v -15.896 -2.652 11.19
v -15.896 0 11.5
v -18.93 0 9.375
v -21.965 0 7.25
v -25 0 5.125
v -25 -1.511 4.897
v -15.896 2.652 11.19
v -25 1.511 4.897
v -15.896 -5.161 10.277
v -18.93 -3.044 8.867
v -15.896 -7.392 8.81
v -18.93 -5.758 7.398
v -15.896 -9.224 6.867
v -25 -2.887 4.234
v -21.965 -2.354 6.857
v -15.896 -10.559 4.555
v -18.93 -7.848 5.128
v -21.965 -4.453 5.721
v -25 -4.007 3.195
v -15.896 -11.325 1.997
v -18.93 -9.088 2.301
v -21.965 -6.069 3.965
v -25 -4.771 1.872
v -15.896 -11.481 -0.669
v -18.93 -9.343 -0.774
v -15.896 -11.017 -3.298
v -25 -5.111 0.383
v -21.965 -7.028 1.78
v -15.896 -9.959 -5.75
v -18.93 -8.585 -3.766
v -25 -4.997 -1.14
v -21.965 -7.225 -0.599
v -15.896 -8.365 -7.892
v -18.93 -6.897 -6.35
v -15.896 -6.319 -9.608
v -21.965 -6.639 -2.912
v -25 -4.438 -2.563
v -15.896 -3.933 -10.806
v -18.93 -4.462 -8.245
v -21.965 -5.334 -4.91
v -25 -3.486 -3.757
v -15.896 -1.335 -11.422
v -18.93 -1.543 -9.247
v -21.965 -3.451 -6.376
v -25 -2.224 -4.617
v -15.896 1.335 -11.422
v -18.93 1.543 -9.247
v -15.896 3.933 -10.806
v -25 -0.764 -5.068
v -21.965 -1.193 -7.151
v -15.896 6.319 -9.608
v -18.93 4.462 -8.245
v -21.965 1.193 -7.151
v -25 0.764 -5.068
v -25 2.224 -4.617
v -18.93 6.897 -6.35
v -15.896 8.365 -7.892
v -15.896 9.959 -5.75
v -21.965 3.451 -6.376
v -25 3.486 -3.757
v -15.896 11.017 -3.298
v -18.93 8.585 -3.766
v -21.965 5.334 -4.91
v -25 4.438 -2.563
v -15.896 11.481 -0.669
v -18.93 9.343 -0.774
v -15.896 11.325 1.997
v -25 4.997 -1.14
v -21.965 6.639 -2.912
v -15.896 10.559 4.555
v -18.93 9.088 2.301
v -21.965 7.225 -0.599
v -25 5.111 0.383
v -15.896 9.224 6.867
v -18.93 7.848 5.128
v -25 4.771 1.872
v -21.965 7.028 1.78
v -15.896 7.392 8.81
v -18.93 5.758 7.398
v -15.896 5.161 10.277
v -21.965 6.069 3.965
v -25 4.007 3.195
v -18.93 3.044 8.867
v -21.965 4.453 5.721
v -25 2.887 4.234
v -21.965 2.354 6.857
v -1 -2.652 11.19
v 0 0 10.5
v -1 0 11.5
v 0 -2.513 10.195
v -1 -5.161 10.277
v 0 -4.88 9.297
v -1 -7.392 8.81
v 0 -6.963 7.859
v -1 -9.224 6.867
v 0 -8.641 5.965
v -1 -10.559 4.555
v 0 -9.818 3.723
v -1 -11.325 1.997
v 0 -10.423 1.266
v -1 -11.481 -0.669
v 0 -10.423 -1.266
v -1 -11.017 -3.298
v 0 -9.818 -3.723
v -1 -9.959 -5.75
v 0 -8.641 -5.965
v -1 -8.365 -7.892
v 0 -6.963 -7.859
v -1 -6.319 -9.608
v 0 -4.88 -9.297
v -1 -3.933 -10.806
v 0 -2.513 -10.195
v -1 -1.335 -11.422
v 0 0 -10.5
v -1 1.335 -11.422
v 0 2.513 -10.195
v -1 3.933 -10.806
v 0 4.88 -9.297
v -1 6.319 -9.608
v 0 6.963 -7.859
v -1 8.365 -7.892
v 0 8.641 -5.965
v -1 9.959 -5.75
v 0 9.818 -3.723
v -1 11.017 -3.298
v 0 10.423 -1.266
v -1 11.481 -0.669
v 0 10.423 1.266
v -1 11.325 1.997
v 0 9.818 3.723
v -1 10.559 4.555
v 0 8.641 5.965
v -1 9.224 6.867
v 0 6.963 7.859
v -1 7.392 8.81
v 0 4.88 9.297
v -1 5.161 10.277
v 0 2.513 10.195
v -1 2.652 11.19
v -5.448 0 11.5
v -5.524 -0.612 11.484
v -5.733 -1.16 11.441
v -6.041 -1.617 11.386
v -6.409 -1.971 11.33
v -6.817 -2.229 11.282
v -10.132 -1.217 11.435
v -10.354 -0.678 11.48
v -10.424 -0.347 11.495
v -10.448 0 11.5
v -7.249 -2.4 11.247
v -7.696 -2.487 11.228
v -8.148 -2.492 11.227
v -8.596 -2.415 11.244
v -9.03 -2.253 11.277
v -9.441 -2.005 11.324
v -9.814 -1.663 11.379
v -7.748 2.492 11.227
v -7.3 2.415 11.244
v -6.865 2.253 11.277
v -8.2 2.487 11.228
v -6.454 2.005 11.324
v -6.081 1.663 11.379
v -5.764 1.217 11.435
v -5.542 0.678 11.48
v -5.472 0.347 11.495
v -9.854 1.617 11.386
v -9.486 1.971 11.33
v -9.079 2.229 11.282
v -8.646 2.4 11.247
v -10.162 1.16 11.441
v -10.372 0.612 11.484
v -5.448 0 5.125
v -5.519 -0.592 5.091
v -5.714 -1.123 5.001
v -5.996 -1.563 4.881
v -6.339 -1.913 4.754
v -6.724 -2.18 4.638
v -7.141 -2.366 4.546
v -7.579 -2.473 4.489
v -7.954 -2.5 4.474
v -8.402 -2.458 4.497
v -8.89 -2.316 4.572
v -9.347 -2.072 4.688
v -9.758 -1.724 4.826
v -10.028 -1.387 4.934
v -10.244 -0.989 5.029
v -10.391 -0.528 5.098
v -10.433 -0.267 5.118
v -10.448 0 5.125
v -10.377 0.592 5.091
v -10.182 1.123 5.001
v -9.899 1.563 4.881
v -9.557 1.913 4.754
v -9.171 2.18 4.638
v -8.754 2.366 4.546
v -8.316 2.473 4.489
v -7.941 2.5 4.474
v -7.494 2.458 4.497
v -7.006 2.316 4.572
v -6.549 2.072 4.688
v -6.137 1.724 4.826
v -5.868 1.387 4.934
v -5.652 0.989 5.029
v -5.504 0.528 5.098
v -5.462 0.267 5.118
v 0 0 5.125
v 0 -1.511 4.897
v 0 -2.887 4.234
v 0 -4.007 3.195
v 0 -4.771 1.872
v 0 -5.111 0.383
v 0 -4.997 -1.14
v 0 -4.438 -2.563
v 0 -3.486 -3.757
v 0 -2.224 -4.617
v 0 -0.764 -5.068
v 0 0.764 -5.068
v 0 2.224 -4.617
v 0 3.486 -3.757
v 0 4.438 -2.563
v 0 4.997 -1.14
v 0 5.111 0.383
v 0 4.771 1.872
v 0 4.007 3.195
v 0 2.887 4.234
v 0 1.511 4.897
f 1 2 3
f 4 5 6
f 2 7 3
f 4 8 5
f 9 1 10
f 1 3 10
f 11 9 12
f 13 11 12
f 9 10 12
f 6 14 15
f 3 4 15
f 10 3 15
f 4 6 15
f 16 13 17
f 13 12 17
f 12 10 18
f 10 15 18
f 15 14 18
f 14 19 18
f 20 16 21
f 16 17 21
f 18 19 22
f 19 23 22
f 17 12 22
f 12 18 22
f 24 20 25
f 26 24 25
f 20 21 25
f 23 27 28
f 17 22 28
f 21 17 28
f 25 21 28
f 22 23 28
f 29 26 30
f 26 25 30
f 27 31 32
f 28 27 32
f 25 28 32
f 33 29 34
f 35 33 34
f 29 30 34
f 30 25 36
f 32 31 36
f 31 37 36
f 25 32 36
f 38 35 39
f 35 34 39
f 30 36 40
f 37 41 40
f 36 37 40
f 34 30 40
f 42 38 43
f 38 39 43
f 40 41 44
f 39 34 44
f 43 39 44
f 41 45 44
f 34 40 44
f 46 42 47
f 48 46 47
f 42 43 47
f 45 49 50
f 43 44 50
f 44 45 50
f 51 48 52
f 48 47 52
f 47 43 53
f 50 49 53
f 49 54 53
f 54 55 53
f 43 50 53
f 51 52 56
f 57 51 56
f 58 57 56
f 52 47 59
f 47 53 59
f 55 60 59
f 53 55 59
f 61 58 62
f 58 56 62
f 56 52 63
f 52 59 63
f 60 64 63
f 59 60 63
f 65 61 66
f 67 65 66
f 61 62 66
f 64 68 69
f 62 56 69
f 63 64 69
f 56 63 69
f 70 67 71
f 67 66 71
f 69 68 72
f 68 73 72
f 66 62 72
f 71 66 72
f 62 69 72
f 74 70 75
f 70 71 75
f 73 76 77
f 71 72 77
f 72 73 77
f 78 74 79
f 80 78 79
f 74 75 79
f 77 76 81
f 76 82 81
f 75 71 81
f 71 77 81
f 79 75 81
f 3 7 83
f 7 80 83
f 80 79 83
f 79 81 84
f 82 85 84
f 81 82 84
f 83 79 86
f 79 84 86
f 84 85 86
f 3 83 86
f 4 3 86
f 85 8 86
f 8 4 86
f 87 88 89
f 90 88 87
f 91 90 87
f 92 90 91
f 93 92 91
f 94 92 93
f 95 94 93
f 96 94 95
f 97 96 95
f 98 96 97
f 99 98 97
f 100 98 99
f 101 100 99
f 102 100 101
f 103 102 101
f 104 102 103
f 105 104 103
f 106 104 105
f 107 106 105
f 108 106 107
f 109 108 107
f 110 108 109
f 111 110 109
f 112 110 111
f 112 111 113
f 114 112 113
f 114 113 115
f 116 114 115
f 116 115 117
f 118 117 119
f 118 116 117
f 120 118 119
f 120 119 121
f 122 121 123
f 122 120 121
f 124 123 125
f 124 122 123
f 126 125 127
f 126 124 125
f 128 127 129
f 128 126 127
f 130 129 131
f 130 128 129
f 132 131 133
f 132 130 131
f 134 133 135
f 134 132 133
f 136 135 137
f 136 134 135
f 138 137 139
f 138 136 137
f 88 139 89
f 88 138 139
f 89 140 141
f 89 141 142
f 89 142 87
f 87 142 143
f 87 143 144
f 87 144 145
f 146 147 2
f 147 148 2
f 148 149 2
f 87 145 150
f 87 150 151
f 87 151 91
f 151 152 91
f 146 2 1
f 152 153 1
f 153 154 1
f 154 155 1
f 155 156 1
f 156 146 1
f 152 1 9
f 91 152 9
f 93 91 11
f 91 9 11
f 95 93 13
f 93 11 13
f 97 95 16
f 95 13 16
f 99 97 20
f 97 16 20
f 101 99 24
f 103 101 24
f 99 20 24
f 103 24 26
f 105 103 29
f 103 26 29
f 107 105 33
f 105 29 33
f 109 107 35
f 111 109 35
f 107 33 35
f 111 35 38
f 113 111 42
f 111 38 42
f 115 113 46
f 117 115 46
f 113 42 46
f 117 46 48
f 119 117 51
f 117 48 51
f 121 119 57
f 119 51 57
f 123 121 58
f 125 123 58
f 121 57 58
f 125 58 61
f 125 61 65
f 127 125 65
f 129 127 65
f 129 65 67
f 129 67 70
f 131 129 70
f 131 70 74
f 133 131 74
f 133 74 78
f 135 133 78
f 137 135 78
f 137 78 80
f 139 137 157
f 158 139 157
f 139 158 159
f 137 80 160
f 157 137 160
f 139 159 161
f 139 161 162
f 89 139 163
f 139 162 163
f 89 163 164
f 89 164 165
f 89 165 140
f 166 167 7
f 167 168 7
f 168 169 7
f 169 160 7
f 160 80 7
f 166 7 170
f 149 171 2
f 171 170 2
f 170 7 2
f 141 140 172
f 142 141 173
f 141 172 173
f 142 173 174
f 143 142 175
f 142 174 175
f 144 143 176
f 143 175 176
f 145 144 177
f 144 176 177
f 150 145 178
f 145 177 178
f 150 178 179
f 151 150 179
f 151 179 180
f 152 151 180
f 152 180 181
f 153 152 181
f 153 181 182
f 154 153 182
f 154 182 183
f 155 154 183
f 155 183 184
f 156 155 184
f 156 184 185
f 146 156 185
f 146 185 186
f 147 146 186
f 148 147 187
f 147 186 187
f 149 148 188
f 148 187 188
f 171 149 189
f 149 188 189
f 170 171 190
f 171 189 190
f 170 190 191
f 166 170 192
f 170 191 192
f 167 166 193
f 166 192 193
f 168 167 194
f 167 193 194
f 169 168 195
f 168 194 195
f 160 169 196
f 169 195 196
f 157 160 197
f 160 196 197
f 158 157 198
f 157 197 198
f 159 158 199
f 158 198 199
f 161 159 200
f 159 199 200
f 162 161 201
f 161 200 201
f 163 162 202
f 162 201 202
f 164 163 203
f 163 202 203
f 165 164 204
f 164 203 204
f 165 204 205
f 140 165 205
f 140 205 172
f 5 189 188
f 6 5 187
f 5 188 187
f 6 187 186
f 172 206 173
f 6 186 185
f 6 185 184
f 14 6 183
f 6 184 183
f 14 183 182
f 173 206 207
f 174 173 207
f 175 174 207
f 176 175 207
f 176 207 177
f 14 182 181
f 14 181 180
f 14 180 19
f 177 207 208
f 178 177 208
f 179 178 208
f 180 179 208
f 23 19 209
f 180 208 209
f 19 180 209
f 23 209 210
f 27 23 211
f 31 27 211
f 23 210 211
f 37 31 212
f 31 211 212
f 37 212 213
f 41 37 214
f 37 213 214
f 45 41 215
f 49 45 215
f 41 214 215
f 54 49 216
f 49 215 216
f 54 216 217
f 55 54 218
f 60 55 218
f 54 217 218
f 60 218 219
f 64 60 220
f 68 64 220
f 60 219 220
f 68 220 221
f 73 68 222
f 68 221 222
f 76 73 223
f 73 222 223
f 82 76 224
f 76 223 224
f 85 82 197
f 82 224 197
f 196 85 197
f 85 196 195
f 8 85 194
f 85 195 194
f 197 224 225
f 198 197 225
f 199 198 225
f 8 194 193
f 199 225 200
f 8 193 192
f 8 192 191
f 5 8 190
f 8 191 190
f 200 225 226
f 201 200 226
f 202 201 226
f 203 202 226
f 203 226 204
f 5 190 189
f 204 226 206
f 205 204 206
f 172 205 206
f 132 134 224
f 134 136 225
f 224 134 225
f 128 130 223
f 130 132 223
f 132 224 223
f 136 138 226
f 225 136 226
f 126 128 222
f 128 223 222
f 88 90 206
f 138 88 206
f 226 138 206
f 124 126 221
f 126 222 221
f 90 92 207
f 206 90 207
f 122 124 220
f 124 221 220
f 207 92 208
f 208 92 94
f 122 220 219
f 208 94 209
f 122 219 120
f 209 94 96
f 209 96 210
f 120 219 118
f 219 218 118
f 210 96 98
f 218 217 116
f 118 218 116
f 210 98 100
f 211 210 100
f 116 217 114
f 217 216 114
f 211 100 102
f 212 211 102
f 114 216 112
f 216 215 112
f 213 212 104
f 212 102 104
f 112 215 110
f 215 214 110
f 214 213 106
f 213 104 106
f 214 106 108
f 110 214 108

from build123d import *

# Parameters (mm, degrees)
F3_D     = 5
F3_DEPTH = 11.501
F4_SIZE  = 1


with BuildPart() as f1:
    # F0 (on Front) → F1 (revolve)
    with BuildSketch(Plane.XZ):
        Polygon((-15.895556457, 11.5), (-25, 5.125), (0, 5.125), (0, 11.5), align=None)
    revolve(axis=Axis((-30.6950435042, 0, 0), (1, 0, 0)))

    # F3 (through all, one way)
    with BuildSketch(Plane(origin=(0, 0, 0), x_dir=(1, 0, 0), z_dir=(0, 0, -1))):
        with Locations((-7.9477782285, 0)):
            Circle(F3_D / 2)
    extrude(amount=-F3_DEPTH, mode=Mode.SUBTRACT)

    # F4
    f4_edges = [f1.edges().sort_by_distance(p)[0] for p in [
        (0, 0, -11.5),
    ]]
    chamfer(f4_edges, length=F4_SIZE)


solid = f1.part
